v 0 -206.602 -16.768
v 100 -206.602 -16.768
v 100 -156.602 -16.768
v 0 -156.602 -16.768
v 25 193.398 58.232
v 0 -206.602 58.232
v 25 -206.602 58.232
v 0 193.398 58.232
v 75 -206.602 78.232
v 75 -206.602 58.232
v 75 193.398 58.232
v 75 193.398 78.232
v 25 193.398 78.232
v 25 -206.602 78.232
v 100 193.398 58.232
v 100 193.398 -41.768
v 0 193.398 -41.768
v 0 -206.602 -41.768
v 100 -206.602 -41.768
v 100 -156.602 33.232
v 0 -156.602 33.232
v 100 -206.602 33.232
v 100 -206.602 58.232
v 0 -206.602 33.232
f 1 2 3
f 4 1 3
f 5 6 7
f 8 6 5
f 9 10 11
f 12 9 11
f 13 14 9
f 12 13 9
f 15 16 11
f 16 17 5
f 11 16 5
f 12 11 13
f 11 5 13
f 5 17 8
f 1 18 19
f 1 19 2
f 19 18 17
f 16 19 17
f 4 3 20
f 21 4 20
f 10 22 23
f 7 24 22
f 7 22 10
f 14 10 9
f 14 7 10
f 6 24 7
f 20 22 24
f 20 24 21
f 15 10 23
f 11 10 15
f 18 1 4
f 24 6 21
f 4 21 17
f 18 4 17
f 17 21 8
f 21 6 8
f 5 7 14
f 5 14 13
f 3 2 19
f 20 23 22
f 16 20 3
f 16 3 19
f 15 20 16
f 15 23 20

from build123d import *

# Parameters (mm, degrees)
F0_W     = 400
F0_H     = 100
F1_DEPTH = 100
F2_W     = 50
F2_H     = 50
F3_DEPTH = 100
F4_W     = 50
F4_H     = 400
F5_DEPTH = 20


with BuildPart() as f1:
    # F0 (on Right) → F1 (new body)
    with BuildSketch(Plane.YZ):
        with Locations((-6.60181, 8.23221)):
            Rectangle(F0_W, F0_H)
    extrude(amount=F1_DEPTH)

    # F2 (on face) → F3 (cut)
    with BuildSketch(Plane.YZ.offset(100)):
        with Locations((-181.60181, 8.23221)):
            Rectangle(F2_W, F2_H)
    extrude(amount=-F3_DEPTH, mode=Mode.SUBTRACT)

    # F4 (on face) → F5 (join)
    with BuildSketch(Plane.XY.offset(58.23221)):
        with Locations((50, -6.60181)):
            Rectangle(F4_W, F4_H)
    extrude(amount=F5_DEPTH)


solid = f1.part
